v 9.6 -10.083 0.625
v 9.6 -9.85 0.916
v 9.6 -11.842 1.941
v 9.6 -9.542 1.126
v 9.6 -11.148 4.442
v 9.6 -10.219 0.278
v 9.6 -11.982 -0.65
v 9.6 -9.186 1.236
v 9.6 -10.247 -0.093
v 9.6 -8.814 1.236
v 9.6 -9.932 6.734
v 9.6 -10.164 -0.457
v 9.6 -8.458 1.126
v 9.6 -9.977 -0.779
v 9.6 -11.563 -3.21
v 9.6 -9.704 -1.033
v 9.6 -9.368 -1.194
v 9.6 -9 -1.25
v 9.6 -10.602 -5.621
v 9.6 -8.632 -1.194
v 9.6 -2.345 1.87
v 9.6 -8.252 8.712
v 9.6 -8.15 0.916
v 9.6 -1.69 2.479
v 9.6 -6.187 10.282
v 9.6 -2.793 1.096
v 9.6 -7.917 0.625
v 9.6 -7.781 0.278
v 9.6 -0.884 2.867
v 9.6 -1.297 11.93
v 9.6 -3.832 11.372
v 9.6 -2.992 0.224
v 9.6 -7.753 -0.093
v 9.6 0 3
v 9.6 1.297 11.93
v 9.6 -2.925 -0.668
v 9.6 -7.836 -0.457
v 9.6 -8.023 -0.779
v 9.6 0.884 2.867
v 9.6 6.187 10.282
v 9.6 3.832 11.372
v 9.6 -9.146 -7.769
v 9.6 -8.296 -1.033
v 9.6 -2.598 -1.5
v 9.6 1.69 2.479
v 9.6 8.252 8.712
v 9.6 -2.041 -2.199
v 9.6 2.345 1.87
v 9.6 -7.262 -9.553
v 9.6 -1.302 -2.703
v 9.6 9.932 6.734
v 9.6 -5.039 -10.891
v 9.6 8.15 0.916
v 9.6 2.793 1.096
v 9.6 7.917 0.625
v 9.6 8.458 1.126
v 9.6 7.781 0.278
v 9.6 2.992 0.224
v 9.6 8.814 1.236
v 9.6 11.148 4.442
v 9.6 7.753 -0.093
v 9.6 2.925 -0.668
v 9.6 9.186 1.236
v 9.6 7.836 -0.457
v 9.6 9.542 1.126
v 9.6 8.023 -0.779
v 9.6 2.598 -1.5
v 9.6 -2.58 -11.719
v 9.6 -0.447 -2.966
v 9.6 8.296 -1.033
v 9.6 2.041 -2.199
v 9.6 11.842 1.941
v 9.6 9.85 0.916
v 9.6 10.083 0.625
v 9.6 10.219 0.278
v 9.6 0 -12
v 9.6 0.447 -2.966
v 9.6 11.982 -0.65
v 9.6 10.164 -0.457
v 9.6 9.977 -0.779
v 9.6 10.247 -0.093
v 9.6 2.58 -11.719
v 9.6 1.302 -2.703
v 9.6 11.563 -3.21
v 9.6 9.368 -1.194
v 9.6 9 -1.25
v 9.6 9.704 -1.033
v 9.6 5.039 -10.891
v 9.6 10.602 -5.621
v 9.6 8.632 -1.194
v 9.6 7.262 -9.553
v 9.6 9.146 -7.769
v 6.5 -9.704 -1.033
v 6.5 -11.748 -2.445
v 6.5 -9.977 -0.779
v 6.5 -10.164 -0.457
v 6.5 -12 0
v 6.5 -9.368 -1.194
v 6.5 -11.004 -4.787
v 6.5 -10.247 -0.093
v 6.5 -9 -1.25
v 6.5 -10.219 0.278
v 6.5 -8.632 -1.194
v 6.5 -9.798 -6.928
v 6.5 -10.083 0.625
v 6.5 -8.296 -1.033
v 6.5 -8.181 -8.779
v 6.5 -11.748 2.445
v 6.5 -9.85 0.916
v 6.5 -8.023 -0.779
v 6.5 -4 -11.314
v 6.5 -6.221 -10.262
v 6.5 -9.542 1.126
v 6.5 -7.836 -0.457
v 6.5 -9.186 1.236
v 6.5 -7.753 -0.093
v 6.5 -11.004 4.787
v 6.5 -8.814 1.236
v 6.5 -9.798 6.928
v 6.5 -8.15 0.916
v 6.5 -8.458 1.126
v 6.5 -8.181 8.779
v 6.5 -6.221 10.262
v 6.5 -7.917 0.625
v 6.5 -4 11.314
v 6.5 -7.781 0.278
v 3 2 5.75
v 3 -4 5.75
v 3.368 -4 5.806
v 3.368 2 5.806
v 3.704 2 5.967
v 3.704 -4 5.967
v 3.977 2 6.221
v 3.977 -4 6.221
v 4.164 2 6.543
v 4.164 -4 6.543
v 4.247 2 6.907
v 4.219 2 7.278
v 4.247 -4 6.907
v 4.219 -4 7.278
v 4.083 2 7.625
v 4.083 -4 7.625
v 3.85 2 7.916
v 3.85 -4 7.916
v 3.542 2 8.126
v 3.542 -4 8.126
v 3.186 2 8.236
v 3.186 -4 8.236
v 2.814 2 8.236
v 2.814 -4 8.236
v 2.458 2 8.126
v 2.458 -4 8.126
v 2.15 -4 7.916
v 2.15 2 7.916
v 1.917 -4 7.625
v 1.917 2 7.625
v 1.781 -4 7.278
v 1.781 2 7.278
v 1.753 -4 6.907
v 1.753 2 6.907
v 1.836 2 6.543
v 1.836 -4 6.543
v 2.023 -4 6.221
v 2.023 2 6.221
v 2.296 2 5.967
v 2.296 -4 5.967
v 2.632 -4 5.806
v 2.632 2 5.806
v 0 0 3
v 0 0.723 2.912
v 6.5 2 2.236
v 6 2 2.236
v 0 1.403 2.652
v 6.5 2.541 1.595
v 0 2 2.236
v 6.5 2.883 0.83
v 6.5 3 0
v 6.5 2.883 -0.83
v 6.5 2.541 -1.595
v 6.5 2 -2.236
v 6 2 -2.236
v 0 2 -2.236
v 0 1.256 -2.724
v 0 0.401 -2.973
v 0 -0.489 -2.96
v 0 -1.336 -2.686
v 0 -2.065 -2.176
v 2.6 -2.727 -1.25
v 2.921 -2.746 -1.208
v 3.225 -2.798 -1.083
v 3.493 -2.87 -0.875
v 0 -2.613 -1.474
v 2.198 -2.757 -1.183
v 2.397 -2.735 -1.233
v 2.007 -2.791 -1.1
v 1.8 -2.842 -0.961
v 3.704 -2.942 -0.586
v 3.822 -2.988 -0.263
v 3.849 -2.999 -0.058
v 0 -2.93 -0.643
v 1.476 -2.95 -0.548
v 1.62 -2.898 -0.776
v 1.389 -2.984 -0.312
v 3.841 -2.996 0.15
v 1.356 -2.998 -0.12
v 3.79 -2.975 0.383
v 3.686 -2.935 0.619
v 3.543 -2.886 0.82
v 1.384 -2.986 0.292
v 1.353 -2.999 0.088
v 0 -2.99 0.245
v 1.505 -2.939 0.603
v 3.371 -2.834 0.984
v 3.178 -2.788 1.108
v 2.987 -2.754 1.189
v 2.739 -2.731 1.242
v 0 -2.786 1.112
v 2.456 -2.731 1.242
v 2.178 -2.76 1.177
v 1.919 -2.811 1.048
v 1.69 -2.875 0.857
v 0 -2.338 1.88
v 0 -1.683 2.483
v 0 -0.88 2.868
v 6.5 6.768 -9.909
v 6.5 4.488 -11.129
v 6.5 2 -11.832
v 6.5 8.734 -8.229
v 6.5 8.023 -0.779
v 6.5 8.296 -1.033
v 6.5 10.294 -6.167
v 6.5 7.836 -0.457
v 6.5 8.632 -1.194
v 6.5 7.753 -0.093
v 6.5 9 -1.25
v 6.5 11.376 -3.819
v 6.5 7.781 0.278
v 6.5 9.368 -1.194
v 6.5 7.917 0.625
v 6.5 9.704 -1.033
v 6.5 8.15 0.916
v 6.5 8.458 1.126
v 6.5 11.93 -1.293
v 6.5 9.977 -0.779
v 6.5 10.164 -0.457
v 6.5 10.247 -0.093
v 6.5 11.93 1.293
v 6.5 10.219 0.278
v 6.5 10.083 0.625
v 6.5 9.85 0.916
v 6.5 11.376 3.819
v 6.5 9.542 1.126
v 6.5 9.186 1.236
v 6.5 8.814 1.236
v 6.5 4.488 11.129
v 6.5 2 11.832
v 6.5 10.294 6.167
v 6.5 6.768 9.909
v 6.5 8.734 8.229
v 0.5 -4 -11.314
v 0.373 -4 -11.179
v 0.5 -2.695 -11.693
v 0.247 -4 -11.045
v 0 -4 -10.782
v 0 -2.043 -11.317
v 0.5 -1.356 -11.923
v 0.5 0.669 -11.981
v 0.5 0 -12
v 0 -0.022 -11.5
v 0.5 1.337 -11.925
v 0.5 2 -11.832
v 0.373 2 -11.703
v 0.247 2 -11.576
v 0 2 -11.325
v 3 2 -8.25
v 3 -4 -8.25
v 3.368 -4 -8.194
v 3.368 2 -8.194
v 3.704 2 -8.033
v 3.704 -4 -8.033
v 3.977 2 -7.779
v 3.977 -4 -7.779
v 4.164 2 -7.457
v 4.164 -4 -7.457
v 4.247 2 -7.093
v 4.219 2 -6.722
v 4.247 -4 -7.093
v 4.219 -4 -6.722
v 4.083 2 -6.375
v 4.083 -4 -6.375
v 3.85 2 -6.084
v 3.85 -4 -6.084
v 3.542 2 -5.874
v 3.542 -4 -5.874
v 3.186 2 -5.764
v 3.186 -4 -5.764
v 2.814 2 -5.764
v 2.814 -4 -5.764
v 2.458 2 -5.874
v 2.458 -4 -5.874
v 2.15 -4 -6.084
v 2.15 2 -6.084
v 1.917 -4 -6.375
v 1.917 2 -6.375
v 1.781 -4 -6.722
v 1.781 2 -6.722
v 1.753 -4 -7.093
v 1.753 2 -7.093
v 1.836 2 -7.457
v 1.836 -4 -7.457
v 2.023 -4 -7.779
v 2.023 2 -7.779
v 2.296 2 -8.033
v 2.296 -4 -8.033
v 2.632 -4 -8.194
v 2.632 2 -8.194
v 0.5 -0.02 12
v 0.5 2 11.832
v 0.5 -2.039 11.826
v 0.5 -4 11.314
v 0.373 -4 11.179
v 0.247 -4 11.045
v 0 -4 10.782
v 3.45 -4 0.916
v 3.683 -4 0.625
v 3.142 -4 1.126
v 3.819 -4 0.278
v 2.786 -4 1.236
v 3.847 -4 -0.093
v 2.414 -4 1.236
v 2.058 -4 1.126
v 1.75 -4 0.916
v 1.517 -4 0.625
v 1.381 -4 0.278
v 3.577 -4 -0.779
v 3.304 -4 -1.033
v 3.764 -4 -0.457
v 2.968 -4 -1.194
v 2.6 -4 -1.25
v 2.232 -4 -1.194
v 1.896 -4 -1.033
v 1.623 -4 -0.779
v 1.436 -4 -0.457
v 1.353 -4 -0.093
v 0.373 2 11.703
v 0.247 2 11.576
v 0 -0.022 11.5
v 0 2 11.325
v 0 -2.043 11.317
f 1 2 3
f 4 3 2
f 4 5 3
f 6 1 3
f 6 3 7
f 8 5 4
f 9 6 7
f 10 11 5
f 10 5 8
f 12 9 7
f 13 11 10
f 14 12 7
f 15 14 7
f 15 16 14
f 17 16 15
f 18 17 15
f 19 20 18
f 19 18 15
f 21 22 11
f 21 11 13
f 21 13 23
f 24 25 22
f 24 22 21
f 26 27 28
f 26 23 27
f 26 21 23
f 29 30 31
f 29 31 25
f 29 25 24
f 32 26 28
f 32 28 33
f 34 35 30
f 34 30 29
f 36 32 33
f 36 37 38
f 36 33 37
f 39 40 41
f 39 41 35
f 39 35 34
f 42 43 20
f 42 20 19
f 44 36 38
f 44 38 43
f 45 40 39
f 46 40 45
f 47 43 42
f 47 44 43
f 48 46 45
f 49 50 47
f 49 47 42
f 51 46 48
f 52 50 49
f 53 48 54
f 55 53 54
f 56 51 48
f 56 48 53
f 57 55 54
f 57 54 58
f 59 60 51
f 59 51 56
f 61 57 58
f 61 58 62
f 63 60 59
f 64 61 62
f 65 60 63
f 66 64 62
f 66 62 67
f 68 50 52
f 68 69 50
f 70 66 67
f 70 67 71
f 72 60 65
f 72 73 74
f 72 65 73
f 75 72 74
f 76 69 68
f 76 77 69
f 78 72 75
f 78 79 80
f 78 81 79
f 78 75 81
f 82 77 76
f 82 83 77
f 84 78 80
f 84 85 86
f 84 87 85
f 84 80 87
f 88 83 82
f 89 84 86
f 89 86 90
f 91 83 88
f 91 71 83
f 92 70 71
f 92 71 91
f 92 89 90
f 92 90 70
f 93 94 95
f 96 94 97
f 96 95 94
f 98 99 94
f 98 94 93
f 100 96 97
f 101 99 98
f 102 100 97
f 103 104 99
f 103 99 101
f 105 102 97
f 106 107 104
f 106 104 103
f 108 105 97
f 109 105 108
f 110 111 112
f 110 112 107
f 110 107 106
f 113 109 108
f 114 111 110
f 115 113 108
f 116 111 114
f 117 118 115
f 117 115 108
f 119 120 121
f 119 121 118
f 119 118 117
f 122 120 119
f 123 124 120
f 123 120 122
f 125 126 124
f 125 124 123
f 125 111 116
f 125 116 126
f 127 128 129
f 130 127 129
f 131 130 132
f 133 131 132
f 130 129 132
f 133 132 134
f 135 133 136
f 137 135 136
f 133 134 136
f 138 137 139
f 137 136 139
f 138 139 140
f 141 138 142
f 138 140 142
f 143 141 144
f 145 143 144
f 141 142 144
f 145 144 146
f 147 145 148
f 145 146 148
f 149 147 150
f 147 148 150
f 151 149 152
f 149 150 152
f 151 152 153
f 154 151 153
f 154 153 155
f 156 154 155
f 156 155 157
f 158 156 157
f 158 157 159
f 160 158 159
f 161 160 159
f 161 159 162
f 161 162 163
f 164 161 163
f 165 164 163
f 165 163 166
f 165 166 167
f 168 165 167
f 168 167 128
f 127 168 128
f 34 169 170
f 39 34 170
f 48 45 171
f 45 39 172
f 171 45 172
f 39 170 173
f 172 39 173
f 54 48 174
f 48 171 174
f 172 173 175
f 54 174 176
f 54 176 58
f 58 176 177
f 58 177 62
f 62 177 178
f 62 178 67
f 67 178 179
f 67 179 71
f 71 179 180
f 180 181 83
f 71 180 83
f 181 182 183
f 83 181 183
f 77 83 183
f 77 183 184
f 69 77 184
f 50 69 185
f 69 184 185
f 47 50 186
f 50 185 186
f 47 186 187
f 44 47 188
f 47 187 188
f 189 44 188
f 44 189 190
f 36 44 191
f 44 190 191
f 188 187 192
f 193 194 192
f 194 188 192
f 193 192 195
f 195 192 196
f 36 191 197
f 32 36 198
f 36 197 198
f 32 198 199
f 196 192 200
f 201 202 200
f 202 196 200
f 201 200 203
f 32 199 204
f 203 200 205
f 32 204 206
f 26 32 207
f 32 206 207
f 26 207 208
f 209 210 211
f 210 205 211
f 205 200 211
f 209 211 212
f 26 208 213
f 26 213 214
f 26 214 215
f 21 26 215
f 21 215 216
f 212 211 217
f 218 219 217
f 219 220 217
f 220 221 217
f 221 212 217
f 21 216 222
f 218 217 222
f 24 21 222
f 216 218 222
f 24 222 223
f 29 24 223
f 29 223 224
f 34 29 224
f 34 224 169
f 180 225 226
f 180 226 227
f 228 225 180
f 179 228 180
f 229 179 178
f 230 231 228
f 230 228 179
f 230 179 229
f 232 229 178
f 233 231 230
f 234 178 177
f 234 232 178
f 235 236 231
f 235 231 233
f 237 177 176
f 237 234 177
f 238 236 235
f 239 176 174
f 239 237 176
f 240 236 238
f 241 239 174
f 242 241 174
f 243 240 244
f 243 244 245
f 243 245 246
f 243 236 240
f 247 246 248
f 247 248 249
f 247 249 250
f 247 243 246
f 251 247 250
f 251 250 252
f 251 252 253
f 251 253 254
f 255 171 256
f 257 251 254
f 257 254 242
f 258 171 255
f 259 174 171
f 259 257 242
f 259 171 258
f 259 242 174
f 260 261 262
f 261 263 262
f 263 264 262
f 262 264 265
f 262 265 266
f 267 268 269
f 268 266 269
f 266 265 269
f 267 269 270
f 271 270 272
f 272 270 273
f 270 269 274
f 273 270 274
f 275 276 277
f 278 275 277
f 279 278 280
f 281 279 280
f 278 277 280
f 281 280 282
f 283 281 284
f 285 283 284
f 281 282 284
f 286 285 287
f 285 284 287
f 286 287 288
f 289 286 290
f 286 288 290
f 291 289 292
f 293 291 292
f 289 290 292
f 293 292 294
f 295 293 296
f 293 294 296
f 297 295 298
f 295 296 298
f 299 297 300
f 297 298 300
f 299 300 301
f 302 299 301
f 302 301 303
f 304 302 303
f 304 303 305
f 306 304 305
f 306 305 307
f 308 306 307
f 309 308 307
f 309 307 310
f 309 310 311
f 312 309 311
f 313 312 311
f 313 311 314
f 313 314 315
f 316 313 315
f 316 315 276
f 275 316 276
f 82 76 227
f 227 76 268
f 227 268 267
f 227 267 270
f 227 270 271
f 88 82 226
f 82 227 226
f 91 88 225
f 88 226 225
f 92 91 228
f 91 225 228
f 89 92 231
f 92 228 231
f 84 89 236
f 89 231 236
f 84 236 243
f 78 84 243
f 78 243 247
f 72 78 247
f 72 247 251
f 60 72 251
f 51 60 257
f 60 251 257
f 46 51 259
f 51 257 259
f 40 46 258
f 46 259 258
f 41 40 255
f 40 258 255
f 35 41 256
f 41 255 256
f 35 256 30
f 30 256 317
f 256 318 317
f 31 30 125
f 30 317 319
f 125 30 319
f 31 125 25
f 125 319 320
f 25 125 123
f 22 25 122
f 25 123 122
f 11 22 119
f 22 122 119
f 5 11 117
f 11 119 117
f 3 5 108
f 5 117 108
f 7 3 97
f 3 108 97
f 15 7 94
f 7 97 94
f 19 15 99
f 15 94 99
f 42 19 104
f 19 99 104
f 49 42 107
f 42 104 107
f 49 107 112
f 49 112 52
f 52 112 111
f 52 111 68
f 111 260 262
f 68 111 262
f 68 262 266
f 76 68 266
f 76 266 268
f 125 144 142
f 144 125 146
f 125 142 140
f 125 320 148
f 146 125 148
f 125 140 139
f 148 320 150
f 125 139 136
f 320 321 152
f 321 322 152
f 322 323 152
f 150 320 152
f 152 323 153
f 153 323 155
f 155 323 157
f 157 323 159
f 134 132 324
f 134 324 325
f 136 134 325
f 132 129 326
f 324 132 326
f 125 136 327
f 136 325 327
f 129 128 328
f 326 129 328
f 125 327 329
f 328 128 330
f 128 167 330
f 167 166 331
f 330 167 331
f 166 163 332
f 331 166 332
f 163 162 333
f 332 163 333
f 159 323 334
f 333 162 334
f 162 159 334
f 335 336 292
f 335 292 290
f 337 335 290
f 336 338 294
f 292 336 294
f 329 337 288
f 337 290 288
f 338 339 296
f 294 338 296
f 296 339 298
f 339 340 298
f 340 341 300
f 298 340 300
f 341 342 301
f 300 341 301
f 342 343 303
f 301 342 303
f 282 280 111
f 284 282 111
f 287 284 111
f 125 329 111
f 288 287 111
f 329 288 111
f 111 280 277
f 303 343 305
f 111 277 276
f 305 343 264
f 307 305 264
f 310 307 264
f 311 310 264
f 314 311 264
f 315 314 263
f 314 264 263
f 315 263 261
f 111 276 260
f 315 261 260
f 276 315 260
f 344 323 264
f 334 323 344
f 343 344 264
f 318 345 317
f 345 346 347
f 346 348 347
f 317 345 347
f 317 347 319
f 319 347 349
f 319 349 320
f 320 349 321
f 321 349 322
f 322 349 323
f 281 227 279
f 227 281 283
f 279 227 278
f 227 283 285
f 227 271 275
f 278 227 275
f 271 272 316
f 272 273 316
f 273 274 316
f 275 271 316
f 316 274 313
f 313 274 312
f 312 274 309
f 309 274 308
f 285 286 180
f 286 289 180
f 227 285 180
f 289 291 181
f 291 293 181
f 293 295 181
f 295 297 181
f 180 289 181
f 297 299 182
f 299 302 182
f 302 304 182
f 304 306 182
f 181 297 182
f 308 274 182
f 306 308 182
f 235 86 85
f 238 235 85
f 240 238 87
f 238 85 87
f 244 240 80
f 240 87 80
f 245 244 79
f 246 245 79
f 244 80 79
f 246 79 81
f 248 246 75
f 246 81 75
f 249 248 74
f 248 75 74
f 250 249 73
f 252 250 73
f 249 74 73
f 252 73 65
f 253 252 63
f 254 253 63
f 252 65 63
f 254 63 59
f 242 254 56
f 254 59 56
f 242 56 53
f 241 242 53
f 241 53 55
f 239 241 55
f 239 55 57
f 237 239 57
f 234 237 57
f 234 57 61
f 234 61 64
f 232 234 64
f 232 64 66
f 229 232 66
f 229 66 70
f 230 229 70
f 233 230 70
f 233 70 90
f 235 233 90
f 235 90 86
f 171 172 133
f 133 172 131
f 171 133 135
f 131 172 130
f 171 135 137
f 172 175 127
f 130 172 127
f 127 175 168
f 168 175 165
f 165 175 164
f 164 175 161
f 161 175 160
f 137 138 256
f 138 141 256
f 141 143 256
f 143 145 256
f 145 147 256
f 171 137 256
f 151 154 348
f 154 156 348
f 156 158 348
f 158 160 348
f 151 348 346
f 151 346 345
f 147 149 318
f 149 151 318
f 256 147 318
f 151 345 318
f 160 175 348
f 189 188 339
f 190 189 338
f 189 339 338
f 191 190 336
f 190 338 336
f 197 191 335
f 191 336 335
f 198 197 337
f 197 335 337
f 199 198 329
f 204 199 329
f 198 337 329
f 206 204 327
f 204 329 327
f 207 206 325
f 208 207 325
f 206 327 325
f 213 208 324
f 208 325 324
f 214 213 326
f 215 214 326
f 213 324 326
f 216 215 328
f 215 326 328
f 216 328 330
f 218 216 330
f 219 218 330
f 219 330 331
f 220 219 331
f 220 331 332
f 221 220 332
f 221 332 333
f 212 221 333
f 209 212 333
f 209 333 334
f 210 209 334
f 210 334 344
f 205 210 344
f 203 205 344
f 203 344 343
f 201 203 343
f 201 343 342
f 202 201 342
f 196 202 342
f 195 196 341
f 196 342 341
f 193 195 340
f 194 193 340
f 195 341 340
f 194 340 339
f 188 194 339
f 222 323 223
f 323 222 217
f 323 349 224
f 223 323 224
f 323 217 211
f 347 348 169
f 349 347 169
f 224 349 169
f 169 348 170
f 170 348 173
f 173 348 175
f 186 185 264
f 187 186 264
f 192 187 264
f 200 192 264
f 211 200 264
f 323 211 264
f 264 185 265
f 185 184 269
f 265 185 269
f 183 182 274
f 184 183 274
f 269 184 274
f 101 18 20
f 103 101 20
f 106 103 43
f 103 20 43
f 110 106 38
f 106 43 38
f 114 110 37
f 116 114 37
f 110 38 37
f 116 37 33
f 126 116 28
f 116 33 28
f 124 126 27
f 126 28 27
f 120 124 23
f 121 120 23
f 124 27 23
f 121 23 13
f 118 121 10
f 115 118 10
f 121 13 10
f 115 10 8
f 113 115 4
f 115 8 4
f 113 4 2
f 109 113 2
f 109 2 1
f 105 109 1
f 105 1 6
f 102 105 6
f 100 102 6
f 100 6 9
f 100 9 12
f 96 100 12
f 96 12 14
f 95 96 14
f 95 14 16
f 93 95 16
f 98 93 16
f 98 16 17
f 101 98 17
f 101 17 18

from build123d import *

# Parameters (mm, degrees)
SKETCH_1_R          = 12
EXTRUDE_1_DEPTH     = 6
SKETCH_2_R          = 12
EXTRUDE_2_DEPTH     = 3.6
SKETCH_3_R          = 3
CUT_EXTRUDE_1_DEPTH = 20.497692171
CUT_EXTRUDE_2_DEPTH = 6
CHAMFER_1_SIZE      = 0.5
SKETCH_5_R          = 1.25
CUT_EXTRUDE_3_DEPTH = 23.184679398
CUT_EXTRUDE_7_DEPTH = 0.5
SKETCH_13_R         = 1.25
CUT_EXTRUDE_8_DEPTH = 23.184679398
SKETCH_8_R          = 1.25
CUT_EXTRUDE_9_DEPTH = 20.49769222


with BuildPart() as part:
    # 草图1 → 凸台-拉伸1 (new body)
    with BuildSketch(Plane(origin=(0, 0, 0), x_dir=(0, 0, -1), z_dir=(1, 0, 0))):
        Circle(SKETCH_1_R)
    extrude(amount=EXTRUDE_1_DEPTH)

    # 草图2 → 凸台-拉伸2 (add)
    with BuildSketch(Plane(origin=(6, 0, 0), x_dir=(0, 0, -1), z_dir=(1, 0, 0))):
        Circle(SKETCH_2_R)
    extrude(amount=EXTRUDE_2_DEPTH)

    # 草图3 → 切除-拉伸1 (cut, through all)
    with BuildSketch(Plane.ZY):
        Circle(SKETCH_3_R)
    extrude(amount=-CUT_EXTRUDE_1_DEPTH, mode=Mode.SUBTRACT)

    # 草图4 → 切除-拉伸2 (cut)
    with BuildSketch(Plane.ZY):
        with BuildLine():
            Line((-11.832159566, 2), (11.832159566, 2))
            ThreePointArc((11.832159566, 2), (0, 12), (-11.832159566, 2))
        make_face()
        with BuildLine():
            Line((11.313708499, -4), (-11.313708499, -4))
            ThreePointArc((-11.313708499, -4), (0, -12), (11.313708499, -4))
        make_face()
    extrude(amount=-CUT_EXTRUDE_2_DEPTH, mode=Mode.SUBTRACT)

    # 倒角1
    chamfer_1_edges = [part.edges().sort_by_distance(p)[0] for p in [
        (0, -1.033052698, 11.955450729),
        (0, -2.029223745, -11.827182716),
    ]]
    chamfer(chamfer_1_edges, length=CHAMFER_1_SIZE)

    # 草图5 → 切除-拉伸3 (cut, through all)
    with BuildSketch(Plane.XZ.offset(4)):
        with Locations(Location((3, -7, 0), (0, 0, 270))):
            Circle(SKETCH_5_R)
        with Locations(Location((3, 7, 0), (0, 0, 270))):
            Circle(SKETCH_5_R)
    extrude(amount=-CUT_EXTRUDE_3_DEPTH, mode=Mode.SUBTRACT)

    # 草图12 → 切除-拉伸7 (cut)
    with BuildSketch(Plane.ZY.offset(-6)):
        with BuildLine():
            Line((11.313708499, -4), (-11.313708499, -4))
            ThreePointArc((-11.313708499, -4), (0, -12), (11.313708499, -4))
        make_face()
        with BuildLine():
            Line((2.236067977, 2), (11.832159566, 2))
            ThreePointArc((11.832159566, 2), (0, 12), (-11.832159566, 2))
            Line((-11.832159566, 2), (-2.236067977, 2))
            ThreePointArc((-2.236067977, 2), (0, 3), (2.236067977, 2))
        make_face()
    extrude(amount=-CUT_EXTRUDE_7_DEPTH, mode=Mode.SUBTRACT)

    # 草图13 → 切除-拉伸8 (cut, through all)
    with BuildSketch(Plane(origin=(0, -4, 0), x_dir=(-1, 0, 0), z_dir=(0, -1, 0))):
        with Locations(Location((-2.6, 0, 0), (0, 0, 90))):
            Circle(SKETCH_13_R)
    extrude(amount=-CUT_EXTRUDE_8_DEPTH, mode=Mode.SUBTRACT)

    # 草图8 → 切除-拉伸9 (cut, through all)
    with BuildSketch(Plane(origin=(9.6, 0, 0), x_dir=(0, 0, -1), z_dir=(1, 0, 0))):
        with Locations((0, 9)):
            Circle(SKETCH_8_R)
        with Locations((0, -9)):
            Circle(SKETCH_8_R)
    extrude(amount=-CUT_EXTRUDE_9_DEPTH, mode=Mode.SUBTRACT)


solid = part.part
